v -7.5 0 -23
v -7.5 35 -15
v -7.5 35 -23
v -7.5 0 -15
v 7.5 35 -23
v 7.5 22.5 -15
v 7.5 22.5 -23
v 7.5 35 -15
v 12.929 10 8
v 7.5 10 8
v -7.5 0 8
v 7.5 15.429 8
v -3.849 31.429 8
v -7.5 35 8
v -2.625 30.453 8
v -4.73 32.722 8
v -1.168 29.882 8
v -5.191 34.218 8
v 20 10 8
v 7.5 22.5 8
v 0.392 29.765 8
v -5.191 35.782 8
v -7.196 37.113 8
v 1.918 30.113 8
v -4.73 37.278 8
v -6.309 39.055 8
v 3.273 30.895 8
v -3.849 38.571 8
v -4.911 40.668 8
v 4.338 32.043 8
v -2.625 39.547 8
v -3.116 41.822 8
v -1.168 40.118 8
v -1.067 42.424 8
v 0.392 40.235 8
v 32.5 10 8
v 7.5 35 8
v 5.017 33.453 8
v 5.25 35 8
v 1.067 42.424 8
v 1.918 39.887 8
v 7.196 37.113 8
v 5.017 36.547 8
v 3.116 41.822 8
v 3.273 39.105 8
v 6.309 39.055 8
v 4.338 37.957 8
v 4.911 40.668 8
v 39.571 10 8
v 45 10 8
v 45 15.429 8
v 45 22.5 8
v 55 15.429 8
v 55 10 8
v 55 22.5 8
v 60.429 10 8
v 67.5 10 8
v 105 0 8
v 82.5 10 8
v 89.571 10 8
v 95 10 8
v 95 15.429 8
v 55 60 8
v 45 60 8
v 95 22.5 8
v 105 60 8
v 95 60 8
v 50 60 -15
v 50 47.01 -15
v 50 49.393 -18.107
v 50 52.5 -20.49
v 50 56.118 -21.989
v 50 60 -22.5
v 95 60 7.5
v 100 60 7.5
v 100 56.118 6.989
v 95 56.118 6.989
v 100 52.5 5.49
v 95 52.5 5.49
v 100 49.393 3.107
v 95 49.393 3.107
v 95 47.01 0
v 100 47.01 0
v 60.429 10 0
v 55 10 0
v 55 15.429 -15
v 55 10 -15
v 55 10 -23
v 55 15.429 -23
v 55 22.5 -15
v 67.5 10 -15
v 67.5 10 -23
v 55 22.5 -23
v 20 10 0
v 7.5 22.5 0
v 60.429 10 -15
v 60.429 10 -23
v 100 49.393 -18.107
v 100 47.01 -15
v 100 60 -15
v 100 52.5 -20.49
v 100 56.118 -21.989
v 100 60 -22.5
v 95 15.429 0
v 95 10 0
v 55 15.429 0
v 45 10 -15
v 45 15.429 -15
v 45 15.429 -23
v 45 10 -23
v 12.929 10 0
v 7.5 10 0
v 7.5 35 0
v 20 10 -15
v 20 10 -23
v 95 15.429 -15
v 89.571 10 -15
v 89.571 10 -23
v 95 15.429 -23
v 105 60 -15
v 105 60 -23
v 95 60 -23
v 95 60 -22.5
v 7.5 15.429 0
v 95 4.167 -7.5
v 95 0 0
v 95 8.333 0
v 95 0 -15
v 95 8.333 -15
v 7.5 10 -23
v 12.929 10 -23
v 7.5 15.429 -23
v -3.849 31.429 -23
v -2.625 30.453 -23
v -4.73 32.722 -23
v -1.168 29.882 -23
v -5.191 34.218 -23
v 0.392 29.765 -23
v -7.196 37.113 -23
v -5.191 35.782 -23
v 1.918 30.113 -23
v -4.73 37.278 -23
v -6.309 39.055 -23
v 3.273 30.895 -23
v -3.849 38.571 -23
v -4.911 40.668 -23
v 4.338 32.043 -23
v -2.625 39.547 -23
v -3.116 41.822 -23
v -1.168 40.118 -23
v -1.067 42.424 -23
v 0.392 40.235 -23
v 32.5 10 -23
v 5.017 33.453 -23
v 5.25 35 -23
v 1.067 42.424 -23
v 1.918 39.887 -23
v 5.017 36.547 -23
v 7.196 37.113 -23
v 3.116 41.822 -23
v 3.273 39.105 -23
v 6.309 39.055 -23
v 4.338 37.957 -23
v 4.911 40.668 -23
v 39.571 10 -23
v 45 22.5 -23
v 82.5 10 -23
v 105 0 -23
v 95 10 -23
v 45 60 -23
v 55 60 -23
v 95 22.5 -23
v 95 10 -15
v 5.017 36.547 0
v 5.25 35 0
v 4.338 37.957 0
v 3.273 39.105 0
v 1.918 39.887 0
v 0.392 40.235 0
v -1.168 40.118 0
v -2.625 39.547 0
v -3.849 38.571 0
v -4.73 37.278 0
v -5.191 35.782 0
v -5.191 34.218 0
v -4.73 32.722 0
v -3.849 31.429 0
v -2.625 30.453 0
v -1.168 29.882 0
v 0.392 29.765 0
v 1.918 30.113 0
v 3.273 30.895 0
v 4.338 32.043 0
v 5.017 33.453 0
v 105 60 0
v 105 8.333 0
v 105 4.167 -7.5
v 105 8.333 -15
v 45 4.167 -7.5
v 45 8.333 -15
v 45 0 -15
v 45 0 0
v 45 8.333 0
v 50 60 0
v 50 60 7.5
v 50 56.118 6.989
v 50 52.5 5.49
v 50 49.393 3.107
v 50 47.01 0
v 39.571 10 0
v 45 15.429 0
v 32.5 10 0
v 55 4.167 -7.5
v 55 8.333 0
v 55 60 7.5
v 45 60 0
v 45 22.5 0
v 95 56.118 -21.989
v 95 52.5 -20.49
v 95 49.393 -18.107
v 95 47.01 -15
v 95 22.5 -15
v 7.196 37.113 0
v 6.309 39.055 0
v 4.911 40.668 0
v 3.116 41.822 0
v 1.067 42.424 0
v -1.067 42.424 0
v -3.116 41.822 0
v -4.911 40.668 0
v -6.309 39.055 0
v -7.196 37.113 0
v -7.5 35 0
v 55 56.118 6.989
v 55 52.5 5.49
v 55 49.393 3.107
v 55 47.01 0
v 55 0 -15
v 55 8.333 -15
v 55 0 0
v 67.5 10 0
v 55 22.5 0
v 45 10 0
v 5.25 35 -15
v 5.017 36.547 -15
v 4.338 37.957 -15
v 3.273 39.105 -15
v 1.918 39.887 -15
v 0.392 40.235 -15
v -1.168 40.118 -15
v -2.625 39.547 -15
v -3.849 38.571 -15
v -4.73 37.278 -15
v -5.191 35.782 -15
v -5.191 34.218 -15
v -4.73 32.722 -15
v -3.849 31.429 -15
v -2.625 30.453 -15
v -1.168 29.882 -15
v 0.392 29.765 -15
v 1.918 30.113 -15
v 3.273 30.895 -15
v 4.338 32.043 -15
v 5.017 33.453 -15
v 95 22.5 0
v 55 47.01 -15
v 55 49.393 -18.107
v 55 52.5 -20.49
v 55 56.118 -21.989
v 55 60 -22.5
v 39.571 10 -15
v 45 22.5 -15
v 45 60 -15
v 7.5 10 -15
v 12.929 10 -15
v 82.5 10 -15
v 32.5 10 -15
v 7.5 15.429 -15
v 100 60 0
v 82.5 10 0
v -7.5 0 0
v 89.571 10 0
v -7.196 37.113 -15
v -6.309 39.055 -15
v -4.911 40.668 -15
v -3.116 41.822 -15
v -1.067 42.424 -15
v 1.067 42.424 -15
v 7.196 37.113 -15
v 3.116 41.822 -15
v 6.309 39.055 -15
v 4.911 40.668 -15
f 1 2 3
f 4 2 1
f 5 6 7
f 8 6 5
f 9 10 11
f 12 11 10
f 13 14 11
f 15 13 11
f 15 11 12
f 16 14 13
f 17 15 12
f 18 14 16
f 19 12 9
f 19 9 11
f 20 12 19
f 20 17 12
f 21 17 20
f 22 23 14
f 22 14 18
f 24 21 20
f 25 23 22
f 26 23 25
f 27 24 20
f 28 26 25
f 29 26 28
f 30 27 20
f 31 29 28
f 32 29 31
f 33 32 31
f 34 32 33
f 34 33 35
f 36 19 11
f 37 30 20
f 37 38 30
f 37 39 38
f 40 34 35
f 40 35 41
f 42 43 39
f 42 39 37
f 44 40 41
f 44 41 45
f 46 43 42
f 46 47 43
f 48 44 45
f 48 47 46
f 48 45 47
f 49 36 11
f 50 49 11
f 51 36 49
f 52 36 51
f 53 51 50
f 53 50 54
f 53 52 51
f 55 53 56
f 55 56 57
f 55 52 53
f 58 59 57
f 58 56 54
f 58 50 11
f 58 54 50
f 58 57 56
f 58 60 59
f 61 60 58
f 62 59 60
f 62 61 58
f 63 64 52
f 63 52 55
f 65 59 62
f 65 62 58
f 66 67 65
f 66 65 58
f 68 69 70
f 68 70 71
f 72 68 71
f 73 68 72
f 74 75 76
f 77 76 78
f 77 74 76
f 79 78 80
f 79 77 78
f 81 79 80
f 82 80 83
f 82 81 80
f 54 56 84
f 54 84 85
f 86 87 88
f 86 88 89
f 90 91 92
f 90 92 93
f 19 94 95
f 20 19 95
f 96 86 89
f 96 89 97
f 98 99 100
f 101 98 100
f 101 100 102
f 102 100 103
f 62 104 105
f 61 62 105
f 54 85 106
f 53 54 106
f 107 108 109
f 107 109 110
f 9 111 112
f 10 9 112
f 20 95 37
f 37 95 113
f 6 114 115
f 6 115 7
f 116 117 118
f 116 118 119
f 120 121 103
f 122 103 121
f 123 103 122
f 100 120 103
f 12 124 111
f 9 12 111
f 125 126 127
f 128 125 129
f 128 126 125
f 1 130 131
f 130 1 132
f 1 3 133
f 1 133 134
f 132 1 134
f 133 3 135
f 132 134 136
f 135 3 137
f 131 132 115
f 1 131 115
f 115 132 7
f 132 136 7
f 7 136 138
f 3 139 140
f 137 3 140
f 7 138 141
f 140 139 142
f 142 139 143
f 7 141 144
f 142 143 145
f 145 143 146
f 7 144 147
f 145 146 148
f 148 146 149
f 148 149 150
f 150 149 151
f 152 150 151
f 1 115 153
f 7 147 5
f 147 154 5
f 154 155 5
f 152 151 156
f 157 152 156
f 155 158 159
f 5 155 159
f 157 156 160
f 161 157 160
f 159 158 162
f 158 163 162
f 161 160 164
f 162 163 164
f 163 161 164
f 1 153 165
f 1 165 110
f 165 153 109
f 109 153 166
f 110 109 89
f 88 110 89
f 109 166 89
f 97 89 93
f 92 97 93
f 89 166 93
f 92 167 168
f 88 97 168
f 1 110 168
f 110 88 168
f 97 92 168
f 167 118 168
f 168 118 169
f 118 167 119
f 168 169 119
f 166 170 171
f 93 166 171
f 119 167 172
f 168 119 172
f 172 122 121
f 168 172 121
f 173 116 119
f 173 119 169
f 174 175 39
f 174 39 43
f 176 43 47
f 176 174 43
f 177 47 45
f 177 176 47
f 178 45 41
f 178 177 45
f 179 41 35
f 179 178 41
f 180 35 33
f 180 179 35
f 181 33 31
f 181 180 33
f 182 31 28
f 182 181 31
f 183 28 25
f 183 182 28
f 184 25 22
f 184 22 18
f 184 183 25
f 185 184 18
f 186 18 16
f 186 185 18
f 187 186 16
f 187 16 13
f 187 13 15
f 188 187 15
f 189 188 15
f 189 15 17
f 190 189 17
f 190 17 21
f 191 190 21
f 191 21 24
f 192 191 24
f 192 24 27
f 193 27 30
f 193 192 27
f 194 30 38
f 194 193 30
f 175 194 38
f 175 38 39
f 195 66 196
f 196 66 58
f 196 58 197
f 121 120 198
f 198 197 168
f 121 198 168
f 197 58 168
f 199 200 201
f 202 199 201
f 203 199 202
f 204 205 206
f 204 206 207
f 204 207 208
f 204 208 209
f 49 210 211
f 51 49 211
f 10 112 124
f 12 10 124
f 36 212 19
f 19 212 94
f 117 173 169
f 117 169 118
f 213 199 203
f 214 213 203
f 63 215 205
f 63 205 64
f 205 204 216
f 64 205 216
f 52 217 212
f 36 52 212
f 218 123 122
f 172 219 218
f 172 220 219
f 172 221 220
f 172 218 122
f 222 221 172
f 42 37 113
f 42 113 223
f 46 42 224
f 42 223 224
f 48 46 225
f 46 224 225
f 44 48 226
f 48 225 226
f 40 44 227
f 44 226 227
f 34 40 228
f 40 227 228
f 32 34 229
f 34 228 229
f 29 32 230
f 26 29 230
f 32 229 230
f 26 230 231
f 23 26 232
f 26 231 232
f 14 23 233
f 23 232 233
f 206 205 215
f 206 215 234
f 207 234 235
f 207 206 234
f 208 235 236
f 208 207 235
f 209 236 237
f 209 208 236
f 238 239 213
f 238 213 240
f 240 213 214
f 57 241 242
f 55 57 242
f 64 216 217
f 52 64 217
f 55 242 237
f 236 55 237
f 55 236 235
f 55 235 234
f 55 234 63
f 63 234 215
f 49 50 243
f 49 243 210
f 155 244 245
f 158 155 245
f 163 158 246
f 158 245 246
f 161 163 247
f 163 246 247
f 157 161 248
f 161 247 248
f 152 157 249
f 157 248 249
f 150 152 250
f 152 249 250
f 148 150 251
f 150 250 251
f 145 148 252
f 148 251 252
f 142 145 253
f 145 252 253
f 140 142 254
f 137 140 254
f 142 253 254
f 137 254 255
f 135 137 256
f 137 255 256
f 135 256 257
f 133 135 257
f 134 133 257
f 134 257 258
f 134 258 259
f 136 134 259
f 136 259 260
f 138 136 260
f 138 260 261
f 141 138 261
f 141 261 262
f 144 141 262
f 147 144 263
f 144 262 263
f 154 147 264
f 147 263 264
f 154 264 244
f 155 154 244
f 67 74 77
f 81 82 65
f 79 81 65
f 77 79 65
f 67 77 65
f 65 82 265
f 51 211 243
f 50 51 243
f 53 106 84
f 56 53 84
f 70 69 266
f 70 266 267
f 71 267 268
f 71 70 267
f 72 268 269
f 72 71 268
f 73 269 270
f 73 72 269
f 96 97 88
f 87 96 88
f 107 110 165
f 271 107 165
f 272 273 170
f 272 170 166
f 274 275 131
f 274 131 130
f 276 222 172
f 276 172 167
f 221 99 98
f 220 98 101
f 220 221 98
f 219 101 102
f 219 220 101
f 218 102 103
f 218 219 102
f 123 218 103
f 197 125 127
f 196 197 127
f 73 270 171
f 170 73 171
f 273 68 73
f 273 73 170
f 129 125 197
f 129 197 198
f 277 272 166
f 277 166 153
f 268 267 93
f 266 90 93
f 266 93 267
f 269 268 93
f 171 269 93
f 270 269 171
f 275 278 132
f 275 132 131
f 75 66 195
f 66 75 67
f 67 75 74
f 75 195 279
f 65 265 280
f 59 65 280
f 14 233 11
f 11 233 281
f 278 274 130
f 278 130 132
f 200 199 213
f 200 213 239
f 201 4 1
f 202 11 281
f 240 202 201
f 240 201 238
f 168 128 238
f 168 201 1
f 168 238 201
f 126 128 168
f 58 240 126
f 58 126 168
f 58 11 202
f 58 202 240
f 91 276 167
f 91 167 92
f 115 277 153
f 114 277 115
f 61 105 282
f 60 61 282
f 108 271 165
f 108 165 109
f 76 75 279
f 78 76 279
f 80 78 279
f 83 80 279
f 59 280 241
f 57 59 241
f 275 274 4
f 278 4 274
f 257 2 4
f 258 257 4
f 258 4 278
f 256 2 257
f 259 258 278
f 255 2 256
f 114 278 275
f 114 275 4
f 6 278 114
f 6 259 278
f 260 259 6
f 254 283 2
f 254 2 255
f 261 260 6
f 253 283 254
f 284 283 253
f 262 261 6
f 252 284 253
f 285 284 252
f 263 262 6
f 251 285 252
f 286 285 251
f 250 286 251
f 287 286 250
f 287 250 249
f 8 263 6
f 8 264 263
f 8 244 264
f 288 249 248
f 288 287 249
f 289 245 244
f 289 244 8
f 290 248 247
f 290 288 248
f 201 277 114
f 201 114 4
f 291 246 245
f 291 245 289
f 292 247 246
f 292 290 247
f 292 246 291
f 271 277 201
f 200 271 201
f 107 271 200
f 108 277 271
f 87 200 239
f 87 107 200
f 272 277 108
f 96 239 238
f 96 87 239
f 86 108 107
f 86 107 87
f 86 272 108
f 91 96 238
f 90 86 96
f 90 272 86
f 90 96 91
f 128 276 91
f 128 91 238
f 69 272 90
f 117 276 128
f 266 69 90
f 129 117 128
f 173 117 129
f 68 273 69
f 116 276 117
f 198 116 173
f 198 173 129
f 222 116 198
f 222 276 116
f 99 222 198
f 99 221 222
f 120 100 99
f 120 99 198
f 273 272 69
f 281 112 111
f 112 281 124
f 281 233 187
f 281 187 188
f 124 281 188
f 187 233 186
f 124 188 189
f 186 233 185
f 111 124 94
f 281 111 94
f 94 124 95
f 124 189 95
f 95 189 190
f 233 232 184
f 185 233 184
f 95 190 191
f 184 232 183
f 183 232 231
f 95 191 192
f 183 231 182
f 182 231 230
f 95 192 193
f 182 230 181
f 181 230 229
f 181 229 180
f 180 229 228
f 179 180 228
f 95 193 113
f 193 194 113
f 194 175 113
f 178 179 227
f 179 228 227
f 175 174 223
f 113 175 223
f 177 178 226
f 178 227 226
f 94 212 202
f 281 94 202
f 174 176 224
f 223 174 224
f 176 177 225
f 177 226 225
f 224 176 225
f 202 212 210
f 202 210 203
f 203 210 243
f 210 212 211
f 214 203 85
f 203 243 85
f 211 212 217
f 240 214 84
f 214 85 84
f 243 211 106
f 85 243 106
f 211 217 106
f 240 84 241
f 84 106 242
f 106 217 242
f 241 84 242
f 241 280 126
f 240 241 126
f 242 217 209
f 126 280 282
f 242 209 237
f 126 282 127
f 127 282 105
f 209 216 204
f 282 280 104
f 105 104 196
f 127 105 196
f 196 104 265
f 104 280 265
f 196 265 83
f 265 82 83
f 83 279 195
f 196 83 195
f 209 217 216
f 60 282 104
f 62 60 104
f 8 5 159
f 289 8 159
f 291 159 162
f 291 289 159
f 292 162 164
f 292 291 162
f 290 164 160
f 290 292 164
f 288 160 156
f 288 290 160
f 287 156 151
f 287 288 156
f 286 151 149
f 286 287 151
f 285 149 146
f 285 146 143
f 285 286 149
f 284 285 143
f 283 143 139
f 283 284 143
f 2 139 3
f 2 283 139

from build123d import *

# Parameters (mm, degrees)
SKETCH1_R            = 5.25
BOSS_EXTRUDE1_DEPTH  = 8
BOSS_EXTRUDE2_DEPTH  = 10
LPATTERN1_COUNT      = 2
LPATTERN1_PITCH      = 50
MIRROR1_COPY_1_DEPTH = 10
CUT_EXTRUDE1_START   = -5
SKETCH3_R            = 15
CUT_EXTRUDE1_DEPTH   = 50


with BuildPart() as part:
    # Sketch1 → Boss-Extrude1 (new body)
    with BuildSketch(Plane.XY):
        with BuildLine():
            Line((105, 0), (105, 60))
            Line((105, 60), (95, 60))
            Line((95, 60), (95, 22.5))
            Line((95, 22.5), (82.5, 10))
            Line((82.5, 10), (67.5, 10))
            Line((67.5, 10), (55, 22.5))
            Line((55, 22.5), (55, 60))
            Line((55, 60), (45, 60))
            Line((45, 60), (45, 22.5))
            Line((45, 22.5), (32.5, 10))
            Line((32.5, 10), (20, 10))
            Line((20, 10), (7.5, 22.5))
            Line((7.5, 22.5), (7.5, 35))
            ThreePointArc((7.5, 35), (0, 42.5), (-7.5, 35))
            Line((-7.5, 35), (-7.5, 0))
            Line((-7.5, 0), (105, 0))
        make_face()
        Polygon((45, 15.428932188), (45, 10), (39.571067812, 10), align=None, mode=Mode.SUBTRACT)
        Polygon((60.428932188, 10), (55, 10), (55, 15.428932188), align=None, mode=Mode.SUBTRACT)
        Polygon((95, 15.428932188), (95, 10), (89.571067812, 10), align=None, mode=Mode.SUBTRACT)
        with Locations((0, 35)):
            Circle(SKETCH1_R, mode=Mode.SUBTRACT)
        Polygon((7.5, 15.428932188), (12.928932188, 10), (7.5, 10), align=None, mode=Mode.SUBTRACT)
    boss_extrude1 = extrude(amount=BOSS_EXTRUDE1_DEPTH)

    # Sketch2 → Boss-Extrude2 (add)
    with BuildSketch(Plane(origin=(45, 0, 0), x_dir=(0, 0, -1), z_dir=(1, 0, 0))):
        Polygon((7.5, 4.166666667), (0, 8.333333333), (0, 0), (7.5, 0), align=None)
    boss_extrude2 = extrude(amount=BOSS_EXTRUDE2_DEPTH)

    # LPattern1: Boss-Extrude2 ×2
    with Locations(*[(i * LPATTERN1_PITCH, 0, 0) for i in range(1, LPATTERN1_COUNT)]):
        add(boss_extrude2)

    # Mirror1: Boss-Extrude1, Boss-Extrude2 across plane
    add(boss_extrude1.mirror(Plane(origin=(55, 0, -7.5), x_dir=(1, 0, 0), z_dir=(0, 0, 1))))
    add(boss_extrude2.mirror(Plane(origin=(55, 0, -7.5), x_dir=(1, 0, 0), z_dir=(0, 0, 1))))

    # Mirror1 copy 1 sketch → Mirror1 copy 1 (add)
    with BuildSketch(Plane(origin=(95, 0, -15), x_dir=(0, 0, 1), z_dir=(1, 0, 0))):
        Polygon((7.5, -4.166666667), (0, -8.333333333), (0, 0), (7.5, 0), align=None)
    extrude(amount=MIRROR1_COPY_1_DEPTH)

    # Sketch3 → Cut-Extrude1 (cut)
    with BuildSketch(Plane(origin=(55, 0, 0), x_dir=(0, 0, -1), z_dir=(1, 0, 0)).offset(CUT_EXTRUDE1_START)):
        with Locations((7.5, 60)):
            Circle(SKETCH3_R)
    extrude(amount=CUT_EXTRUDE1_DEPTH, mode=Mode.SUBTRACT)


solid = part.part
